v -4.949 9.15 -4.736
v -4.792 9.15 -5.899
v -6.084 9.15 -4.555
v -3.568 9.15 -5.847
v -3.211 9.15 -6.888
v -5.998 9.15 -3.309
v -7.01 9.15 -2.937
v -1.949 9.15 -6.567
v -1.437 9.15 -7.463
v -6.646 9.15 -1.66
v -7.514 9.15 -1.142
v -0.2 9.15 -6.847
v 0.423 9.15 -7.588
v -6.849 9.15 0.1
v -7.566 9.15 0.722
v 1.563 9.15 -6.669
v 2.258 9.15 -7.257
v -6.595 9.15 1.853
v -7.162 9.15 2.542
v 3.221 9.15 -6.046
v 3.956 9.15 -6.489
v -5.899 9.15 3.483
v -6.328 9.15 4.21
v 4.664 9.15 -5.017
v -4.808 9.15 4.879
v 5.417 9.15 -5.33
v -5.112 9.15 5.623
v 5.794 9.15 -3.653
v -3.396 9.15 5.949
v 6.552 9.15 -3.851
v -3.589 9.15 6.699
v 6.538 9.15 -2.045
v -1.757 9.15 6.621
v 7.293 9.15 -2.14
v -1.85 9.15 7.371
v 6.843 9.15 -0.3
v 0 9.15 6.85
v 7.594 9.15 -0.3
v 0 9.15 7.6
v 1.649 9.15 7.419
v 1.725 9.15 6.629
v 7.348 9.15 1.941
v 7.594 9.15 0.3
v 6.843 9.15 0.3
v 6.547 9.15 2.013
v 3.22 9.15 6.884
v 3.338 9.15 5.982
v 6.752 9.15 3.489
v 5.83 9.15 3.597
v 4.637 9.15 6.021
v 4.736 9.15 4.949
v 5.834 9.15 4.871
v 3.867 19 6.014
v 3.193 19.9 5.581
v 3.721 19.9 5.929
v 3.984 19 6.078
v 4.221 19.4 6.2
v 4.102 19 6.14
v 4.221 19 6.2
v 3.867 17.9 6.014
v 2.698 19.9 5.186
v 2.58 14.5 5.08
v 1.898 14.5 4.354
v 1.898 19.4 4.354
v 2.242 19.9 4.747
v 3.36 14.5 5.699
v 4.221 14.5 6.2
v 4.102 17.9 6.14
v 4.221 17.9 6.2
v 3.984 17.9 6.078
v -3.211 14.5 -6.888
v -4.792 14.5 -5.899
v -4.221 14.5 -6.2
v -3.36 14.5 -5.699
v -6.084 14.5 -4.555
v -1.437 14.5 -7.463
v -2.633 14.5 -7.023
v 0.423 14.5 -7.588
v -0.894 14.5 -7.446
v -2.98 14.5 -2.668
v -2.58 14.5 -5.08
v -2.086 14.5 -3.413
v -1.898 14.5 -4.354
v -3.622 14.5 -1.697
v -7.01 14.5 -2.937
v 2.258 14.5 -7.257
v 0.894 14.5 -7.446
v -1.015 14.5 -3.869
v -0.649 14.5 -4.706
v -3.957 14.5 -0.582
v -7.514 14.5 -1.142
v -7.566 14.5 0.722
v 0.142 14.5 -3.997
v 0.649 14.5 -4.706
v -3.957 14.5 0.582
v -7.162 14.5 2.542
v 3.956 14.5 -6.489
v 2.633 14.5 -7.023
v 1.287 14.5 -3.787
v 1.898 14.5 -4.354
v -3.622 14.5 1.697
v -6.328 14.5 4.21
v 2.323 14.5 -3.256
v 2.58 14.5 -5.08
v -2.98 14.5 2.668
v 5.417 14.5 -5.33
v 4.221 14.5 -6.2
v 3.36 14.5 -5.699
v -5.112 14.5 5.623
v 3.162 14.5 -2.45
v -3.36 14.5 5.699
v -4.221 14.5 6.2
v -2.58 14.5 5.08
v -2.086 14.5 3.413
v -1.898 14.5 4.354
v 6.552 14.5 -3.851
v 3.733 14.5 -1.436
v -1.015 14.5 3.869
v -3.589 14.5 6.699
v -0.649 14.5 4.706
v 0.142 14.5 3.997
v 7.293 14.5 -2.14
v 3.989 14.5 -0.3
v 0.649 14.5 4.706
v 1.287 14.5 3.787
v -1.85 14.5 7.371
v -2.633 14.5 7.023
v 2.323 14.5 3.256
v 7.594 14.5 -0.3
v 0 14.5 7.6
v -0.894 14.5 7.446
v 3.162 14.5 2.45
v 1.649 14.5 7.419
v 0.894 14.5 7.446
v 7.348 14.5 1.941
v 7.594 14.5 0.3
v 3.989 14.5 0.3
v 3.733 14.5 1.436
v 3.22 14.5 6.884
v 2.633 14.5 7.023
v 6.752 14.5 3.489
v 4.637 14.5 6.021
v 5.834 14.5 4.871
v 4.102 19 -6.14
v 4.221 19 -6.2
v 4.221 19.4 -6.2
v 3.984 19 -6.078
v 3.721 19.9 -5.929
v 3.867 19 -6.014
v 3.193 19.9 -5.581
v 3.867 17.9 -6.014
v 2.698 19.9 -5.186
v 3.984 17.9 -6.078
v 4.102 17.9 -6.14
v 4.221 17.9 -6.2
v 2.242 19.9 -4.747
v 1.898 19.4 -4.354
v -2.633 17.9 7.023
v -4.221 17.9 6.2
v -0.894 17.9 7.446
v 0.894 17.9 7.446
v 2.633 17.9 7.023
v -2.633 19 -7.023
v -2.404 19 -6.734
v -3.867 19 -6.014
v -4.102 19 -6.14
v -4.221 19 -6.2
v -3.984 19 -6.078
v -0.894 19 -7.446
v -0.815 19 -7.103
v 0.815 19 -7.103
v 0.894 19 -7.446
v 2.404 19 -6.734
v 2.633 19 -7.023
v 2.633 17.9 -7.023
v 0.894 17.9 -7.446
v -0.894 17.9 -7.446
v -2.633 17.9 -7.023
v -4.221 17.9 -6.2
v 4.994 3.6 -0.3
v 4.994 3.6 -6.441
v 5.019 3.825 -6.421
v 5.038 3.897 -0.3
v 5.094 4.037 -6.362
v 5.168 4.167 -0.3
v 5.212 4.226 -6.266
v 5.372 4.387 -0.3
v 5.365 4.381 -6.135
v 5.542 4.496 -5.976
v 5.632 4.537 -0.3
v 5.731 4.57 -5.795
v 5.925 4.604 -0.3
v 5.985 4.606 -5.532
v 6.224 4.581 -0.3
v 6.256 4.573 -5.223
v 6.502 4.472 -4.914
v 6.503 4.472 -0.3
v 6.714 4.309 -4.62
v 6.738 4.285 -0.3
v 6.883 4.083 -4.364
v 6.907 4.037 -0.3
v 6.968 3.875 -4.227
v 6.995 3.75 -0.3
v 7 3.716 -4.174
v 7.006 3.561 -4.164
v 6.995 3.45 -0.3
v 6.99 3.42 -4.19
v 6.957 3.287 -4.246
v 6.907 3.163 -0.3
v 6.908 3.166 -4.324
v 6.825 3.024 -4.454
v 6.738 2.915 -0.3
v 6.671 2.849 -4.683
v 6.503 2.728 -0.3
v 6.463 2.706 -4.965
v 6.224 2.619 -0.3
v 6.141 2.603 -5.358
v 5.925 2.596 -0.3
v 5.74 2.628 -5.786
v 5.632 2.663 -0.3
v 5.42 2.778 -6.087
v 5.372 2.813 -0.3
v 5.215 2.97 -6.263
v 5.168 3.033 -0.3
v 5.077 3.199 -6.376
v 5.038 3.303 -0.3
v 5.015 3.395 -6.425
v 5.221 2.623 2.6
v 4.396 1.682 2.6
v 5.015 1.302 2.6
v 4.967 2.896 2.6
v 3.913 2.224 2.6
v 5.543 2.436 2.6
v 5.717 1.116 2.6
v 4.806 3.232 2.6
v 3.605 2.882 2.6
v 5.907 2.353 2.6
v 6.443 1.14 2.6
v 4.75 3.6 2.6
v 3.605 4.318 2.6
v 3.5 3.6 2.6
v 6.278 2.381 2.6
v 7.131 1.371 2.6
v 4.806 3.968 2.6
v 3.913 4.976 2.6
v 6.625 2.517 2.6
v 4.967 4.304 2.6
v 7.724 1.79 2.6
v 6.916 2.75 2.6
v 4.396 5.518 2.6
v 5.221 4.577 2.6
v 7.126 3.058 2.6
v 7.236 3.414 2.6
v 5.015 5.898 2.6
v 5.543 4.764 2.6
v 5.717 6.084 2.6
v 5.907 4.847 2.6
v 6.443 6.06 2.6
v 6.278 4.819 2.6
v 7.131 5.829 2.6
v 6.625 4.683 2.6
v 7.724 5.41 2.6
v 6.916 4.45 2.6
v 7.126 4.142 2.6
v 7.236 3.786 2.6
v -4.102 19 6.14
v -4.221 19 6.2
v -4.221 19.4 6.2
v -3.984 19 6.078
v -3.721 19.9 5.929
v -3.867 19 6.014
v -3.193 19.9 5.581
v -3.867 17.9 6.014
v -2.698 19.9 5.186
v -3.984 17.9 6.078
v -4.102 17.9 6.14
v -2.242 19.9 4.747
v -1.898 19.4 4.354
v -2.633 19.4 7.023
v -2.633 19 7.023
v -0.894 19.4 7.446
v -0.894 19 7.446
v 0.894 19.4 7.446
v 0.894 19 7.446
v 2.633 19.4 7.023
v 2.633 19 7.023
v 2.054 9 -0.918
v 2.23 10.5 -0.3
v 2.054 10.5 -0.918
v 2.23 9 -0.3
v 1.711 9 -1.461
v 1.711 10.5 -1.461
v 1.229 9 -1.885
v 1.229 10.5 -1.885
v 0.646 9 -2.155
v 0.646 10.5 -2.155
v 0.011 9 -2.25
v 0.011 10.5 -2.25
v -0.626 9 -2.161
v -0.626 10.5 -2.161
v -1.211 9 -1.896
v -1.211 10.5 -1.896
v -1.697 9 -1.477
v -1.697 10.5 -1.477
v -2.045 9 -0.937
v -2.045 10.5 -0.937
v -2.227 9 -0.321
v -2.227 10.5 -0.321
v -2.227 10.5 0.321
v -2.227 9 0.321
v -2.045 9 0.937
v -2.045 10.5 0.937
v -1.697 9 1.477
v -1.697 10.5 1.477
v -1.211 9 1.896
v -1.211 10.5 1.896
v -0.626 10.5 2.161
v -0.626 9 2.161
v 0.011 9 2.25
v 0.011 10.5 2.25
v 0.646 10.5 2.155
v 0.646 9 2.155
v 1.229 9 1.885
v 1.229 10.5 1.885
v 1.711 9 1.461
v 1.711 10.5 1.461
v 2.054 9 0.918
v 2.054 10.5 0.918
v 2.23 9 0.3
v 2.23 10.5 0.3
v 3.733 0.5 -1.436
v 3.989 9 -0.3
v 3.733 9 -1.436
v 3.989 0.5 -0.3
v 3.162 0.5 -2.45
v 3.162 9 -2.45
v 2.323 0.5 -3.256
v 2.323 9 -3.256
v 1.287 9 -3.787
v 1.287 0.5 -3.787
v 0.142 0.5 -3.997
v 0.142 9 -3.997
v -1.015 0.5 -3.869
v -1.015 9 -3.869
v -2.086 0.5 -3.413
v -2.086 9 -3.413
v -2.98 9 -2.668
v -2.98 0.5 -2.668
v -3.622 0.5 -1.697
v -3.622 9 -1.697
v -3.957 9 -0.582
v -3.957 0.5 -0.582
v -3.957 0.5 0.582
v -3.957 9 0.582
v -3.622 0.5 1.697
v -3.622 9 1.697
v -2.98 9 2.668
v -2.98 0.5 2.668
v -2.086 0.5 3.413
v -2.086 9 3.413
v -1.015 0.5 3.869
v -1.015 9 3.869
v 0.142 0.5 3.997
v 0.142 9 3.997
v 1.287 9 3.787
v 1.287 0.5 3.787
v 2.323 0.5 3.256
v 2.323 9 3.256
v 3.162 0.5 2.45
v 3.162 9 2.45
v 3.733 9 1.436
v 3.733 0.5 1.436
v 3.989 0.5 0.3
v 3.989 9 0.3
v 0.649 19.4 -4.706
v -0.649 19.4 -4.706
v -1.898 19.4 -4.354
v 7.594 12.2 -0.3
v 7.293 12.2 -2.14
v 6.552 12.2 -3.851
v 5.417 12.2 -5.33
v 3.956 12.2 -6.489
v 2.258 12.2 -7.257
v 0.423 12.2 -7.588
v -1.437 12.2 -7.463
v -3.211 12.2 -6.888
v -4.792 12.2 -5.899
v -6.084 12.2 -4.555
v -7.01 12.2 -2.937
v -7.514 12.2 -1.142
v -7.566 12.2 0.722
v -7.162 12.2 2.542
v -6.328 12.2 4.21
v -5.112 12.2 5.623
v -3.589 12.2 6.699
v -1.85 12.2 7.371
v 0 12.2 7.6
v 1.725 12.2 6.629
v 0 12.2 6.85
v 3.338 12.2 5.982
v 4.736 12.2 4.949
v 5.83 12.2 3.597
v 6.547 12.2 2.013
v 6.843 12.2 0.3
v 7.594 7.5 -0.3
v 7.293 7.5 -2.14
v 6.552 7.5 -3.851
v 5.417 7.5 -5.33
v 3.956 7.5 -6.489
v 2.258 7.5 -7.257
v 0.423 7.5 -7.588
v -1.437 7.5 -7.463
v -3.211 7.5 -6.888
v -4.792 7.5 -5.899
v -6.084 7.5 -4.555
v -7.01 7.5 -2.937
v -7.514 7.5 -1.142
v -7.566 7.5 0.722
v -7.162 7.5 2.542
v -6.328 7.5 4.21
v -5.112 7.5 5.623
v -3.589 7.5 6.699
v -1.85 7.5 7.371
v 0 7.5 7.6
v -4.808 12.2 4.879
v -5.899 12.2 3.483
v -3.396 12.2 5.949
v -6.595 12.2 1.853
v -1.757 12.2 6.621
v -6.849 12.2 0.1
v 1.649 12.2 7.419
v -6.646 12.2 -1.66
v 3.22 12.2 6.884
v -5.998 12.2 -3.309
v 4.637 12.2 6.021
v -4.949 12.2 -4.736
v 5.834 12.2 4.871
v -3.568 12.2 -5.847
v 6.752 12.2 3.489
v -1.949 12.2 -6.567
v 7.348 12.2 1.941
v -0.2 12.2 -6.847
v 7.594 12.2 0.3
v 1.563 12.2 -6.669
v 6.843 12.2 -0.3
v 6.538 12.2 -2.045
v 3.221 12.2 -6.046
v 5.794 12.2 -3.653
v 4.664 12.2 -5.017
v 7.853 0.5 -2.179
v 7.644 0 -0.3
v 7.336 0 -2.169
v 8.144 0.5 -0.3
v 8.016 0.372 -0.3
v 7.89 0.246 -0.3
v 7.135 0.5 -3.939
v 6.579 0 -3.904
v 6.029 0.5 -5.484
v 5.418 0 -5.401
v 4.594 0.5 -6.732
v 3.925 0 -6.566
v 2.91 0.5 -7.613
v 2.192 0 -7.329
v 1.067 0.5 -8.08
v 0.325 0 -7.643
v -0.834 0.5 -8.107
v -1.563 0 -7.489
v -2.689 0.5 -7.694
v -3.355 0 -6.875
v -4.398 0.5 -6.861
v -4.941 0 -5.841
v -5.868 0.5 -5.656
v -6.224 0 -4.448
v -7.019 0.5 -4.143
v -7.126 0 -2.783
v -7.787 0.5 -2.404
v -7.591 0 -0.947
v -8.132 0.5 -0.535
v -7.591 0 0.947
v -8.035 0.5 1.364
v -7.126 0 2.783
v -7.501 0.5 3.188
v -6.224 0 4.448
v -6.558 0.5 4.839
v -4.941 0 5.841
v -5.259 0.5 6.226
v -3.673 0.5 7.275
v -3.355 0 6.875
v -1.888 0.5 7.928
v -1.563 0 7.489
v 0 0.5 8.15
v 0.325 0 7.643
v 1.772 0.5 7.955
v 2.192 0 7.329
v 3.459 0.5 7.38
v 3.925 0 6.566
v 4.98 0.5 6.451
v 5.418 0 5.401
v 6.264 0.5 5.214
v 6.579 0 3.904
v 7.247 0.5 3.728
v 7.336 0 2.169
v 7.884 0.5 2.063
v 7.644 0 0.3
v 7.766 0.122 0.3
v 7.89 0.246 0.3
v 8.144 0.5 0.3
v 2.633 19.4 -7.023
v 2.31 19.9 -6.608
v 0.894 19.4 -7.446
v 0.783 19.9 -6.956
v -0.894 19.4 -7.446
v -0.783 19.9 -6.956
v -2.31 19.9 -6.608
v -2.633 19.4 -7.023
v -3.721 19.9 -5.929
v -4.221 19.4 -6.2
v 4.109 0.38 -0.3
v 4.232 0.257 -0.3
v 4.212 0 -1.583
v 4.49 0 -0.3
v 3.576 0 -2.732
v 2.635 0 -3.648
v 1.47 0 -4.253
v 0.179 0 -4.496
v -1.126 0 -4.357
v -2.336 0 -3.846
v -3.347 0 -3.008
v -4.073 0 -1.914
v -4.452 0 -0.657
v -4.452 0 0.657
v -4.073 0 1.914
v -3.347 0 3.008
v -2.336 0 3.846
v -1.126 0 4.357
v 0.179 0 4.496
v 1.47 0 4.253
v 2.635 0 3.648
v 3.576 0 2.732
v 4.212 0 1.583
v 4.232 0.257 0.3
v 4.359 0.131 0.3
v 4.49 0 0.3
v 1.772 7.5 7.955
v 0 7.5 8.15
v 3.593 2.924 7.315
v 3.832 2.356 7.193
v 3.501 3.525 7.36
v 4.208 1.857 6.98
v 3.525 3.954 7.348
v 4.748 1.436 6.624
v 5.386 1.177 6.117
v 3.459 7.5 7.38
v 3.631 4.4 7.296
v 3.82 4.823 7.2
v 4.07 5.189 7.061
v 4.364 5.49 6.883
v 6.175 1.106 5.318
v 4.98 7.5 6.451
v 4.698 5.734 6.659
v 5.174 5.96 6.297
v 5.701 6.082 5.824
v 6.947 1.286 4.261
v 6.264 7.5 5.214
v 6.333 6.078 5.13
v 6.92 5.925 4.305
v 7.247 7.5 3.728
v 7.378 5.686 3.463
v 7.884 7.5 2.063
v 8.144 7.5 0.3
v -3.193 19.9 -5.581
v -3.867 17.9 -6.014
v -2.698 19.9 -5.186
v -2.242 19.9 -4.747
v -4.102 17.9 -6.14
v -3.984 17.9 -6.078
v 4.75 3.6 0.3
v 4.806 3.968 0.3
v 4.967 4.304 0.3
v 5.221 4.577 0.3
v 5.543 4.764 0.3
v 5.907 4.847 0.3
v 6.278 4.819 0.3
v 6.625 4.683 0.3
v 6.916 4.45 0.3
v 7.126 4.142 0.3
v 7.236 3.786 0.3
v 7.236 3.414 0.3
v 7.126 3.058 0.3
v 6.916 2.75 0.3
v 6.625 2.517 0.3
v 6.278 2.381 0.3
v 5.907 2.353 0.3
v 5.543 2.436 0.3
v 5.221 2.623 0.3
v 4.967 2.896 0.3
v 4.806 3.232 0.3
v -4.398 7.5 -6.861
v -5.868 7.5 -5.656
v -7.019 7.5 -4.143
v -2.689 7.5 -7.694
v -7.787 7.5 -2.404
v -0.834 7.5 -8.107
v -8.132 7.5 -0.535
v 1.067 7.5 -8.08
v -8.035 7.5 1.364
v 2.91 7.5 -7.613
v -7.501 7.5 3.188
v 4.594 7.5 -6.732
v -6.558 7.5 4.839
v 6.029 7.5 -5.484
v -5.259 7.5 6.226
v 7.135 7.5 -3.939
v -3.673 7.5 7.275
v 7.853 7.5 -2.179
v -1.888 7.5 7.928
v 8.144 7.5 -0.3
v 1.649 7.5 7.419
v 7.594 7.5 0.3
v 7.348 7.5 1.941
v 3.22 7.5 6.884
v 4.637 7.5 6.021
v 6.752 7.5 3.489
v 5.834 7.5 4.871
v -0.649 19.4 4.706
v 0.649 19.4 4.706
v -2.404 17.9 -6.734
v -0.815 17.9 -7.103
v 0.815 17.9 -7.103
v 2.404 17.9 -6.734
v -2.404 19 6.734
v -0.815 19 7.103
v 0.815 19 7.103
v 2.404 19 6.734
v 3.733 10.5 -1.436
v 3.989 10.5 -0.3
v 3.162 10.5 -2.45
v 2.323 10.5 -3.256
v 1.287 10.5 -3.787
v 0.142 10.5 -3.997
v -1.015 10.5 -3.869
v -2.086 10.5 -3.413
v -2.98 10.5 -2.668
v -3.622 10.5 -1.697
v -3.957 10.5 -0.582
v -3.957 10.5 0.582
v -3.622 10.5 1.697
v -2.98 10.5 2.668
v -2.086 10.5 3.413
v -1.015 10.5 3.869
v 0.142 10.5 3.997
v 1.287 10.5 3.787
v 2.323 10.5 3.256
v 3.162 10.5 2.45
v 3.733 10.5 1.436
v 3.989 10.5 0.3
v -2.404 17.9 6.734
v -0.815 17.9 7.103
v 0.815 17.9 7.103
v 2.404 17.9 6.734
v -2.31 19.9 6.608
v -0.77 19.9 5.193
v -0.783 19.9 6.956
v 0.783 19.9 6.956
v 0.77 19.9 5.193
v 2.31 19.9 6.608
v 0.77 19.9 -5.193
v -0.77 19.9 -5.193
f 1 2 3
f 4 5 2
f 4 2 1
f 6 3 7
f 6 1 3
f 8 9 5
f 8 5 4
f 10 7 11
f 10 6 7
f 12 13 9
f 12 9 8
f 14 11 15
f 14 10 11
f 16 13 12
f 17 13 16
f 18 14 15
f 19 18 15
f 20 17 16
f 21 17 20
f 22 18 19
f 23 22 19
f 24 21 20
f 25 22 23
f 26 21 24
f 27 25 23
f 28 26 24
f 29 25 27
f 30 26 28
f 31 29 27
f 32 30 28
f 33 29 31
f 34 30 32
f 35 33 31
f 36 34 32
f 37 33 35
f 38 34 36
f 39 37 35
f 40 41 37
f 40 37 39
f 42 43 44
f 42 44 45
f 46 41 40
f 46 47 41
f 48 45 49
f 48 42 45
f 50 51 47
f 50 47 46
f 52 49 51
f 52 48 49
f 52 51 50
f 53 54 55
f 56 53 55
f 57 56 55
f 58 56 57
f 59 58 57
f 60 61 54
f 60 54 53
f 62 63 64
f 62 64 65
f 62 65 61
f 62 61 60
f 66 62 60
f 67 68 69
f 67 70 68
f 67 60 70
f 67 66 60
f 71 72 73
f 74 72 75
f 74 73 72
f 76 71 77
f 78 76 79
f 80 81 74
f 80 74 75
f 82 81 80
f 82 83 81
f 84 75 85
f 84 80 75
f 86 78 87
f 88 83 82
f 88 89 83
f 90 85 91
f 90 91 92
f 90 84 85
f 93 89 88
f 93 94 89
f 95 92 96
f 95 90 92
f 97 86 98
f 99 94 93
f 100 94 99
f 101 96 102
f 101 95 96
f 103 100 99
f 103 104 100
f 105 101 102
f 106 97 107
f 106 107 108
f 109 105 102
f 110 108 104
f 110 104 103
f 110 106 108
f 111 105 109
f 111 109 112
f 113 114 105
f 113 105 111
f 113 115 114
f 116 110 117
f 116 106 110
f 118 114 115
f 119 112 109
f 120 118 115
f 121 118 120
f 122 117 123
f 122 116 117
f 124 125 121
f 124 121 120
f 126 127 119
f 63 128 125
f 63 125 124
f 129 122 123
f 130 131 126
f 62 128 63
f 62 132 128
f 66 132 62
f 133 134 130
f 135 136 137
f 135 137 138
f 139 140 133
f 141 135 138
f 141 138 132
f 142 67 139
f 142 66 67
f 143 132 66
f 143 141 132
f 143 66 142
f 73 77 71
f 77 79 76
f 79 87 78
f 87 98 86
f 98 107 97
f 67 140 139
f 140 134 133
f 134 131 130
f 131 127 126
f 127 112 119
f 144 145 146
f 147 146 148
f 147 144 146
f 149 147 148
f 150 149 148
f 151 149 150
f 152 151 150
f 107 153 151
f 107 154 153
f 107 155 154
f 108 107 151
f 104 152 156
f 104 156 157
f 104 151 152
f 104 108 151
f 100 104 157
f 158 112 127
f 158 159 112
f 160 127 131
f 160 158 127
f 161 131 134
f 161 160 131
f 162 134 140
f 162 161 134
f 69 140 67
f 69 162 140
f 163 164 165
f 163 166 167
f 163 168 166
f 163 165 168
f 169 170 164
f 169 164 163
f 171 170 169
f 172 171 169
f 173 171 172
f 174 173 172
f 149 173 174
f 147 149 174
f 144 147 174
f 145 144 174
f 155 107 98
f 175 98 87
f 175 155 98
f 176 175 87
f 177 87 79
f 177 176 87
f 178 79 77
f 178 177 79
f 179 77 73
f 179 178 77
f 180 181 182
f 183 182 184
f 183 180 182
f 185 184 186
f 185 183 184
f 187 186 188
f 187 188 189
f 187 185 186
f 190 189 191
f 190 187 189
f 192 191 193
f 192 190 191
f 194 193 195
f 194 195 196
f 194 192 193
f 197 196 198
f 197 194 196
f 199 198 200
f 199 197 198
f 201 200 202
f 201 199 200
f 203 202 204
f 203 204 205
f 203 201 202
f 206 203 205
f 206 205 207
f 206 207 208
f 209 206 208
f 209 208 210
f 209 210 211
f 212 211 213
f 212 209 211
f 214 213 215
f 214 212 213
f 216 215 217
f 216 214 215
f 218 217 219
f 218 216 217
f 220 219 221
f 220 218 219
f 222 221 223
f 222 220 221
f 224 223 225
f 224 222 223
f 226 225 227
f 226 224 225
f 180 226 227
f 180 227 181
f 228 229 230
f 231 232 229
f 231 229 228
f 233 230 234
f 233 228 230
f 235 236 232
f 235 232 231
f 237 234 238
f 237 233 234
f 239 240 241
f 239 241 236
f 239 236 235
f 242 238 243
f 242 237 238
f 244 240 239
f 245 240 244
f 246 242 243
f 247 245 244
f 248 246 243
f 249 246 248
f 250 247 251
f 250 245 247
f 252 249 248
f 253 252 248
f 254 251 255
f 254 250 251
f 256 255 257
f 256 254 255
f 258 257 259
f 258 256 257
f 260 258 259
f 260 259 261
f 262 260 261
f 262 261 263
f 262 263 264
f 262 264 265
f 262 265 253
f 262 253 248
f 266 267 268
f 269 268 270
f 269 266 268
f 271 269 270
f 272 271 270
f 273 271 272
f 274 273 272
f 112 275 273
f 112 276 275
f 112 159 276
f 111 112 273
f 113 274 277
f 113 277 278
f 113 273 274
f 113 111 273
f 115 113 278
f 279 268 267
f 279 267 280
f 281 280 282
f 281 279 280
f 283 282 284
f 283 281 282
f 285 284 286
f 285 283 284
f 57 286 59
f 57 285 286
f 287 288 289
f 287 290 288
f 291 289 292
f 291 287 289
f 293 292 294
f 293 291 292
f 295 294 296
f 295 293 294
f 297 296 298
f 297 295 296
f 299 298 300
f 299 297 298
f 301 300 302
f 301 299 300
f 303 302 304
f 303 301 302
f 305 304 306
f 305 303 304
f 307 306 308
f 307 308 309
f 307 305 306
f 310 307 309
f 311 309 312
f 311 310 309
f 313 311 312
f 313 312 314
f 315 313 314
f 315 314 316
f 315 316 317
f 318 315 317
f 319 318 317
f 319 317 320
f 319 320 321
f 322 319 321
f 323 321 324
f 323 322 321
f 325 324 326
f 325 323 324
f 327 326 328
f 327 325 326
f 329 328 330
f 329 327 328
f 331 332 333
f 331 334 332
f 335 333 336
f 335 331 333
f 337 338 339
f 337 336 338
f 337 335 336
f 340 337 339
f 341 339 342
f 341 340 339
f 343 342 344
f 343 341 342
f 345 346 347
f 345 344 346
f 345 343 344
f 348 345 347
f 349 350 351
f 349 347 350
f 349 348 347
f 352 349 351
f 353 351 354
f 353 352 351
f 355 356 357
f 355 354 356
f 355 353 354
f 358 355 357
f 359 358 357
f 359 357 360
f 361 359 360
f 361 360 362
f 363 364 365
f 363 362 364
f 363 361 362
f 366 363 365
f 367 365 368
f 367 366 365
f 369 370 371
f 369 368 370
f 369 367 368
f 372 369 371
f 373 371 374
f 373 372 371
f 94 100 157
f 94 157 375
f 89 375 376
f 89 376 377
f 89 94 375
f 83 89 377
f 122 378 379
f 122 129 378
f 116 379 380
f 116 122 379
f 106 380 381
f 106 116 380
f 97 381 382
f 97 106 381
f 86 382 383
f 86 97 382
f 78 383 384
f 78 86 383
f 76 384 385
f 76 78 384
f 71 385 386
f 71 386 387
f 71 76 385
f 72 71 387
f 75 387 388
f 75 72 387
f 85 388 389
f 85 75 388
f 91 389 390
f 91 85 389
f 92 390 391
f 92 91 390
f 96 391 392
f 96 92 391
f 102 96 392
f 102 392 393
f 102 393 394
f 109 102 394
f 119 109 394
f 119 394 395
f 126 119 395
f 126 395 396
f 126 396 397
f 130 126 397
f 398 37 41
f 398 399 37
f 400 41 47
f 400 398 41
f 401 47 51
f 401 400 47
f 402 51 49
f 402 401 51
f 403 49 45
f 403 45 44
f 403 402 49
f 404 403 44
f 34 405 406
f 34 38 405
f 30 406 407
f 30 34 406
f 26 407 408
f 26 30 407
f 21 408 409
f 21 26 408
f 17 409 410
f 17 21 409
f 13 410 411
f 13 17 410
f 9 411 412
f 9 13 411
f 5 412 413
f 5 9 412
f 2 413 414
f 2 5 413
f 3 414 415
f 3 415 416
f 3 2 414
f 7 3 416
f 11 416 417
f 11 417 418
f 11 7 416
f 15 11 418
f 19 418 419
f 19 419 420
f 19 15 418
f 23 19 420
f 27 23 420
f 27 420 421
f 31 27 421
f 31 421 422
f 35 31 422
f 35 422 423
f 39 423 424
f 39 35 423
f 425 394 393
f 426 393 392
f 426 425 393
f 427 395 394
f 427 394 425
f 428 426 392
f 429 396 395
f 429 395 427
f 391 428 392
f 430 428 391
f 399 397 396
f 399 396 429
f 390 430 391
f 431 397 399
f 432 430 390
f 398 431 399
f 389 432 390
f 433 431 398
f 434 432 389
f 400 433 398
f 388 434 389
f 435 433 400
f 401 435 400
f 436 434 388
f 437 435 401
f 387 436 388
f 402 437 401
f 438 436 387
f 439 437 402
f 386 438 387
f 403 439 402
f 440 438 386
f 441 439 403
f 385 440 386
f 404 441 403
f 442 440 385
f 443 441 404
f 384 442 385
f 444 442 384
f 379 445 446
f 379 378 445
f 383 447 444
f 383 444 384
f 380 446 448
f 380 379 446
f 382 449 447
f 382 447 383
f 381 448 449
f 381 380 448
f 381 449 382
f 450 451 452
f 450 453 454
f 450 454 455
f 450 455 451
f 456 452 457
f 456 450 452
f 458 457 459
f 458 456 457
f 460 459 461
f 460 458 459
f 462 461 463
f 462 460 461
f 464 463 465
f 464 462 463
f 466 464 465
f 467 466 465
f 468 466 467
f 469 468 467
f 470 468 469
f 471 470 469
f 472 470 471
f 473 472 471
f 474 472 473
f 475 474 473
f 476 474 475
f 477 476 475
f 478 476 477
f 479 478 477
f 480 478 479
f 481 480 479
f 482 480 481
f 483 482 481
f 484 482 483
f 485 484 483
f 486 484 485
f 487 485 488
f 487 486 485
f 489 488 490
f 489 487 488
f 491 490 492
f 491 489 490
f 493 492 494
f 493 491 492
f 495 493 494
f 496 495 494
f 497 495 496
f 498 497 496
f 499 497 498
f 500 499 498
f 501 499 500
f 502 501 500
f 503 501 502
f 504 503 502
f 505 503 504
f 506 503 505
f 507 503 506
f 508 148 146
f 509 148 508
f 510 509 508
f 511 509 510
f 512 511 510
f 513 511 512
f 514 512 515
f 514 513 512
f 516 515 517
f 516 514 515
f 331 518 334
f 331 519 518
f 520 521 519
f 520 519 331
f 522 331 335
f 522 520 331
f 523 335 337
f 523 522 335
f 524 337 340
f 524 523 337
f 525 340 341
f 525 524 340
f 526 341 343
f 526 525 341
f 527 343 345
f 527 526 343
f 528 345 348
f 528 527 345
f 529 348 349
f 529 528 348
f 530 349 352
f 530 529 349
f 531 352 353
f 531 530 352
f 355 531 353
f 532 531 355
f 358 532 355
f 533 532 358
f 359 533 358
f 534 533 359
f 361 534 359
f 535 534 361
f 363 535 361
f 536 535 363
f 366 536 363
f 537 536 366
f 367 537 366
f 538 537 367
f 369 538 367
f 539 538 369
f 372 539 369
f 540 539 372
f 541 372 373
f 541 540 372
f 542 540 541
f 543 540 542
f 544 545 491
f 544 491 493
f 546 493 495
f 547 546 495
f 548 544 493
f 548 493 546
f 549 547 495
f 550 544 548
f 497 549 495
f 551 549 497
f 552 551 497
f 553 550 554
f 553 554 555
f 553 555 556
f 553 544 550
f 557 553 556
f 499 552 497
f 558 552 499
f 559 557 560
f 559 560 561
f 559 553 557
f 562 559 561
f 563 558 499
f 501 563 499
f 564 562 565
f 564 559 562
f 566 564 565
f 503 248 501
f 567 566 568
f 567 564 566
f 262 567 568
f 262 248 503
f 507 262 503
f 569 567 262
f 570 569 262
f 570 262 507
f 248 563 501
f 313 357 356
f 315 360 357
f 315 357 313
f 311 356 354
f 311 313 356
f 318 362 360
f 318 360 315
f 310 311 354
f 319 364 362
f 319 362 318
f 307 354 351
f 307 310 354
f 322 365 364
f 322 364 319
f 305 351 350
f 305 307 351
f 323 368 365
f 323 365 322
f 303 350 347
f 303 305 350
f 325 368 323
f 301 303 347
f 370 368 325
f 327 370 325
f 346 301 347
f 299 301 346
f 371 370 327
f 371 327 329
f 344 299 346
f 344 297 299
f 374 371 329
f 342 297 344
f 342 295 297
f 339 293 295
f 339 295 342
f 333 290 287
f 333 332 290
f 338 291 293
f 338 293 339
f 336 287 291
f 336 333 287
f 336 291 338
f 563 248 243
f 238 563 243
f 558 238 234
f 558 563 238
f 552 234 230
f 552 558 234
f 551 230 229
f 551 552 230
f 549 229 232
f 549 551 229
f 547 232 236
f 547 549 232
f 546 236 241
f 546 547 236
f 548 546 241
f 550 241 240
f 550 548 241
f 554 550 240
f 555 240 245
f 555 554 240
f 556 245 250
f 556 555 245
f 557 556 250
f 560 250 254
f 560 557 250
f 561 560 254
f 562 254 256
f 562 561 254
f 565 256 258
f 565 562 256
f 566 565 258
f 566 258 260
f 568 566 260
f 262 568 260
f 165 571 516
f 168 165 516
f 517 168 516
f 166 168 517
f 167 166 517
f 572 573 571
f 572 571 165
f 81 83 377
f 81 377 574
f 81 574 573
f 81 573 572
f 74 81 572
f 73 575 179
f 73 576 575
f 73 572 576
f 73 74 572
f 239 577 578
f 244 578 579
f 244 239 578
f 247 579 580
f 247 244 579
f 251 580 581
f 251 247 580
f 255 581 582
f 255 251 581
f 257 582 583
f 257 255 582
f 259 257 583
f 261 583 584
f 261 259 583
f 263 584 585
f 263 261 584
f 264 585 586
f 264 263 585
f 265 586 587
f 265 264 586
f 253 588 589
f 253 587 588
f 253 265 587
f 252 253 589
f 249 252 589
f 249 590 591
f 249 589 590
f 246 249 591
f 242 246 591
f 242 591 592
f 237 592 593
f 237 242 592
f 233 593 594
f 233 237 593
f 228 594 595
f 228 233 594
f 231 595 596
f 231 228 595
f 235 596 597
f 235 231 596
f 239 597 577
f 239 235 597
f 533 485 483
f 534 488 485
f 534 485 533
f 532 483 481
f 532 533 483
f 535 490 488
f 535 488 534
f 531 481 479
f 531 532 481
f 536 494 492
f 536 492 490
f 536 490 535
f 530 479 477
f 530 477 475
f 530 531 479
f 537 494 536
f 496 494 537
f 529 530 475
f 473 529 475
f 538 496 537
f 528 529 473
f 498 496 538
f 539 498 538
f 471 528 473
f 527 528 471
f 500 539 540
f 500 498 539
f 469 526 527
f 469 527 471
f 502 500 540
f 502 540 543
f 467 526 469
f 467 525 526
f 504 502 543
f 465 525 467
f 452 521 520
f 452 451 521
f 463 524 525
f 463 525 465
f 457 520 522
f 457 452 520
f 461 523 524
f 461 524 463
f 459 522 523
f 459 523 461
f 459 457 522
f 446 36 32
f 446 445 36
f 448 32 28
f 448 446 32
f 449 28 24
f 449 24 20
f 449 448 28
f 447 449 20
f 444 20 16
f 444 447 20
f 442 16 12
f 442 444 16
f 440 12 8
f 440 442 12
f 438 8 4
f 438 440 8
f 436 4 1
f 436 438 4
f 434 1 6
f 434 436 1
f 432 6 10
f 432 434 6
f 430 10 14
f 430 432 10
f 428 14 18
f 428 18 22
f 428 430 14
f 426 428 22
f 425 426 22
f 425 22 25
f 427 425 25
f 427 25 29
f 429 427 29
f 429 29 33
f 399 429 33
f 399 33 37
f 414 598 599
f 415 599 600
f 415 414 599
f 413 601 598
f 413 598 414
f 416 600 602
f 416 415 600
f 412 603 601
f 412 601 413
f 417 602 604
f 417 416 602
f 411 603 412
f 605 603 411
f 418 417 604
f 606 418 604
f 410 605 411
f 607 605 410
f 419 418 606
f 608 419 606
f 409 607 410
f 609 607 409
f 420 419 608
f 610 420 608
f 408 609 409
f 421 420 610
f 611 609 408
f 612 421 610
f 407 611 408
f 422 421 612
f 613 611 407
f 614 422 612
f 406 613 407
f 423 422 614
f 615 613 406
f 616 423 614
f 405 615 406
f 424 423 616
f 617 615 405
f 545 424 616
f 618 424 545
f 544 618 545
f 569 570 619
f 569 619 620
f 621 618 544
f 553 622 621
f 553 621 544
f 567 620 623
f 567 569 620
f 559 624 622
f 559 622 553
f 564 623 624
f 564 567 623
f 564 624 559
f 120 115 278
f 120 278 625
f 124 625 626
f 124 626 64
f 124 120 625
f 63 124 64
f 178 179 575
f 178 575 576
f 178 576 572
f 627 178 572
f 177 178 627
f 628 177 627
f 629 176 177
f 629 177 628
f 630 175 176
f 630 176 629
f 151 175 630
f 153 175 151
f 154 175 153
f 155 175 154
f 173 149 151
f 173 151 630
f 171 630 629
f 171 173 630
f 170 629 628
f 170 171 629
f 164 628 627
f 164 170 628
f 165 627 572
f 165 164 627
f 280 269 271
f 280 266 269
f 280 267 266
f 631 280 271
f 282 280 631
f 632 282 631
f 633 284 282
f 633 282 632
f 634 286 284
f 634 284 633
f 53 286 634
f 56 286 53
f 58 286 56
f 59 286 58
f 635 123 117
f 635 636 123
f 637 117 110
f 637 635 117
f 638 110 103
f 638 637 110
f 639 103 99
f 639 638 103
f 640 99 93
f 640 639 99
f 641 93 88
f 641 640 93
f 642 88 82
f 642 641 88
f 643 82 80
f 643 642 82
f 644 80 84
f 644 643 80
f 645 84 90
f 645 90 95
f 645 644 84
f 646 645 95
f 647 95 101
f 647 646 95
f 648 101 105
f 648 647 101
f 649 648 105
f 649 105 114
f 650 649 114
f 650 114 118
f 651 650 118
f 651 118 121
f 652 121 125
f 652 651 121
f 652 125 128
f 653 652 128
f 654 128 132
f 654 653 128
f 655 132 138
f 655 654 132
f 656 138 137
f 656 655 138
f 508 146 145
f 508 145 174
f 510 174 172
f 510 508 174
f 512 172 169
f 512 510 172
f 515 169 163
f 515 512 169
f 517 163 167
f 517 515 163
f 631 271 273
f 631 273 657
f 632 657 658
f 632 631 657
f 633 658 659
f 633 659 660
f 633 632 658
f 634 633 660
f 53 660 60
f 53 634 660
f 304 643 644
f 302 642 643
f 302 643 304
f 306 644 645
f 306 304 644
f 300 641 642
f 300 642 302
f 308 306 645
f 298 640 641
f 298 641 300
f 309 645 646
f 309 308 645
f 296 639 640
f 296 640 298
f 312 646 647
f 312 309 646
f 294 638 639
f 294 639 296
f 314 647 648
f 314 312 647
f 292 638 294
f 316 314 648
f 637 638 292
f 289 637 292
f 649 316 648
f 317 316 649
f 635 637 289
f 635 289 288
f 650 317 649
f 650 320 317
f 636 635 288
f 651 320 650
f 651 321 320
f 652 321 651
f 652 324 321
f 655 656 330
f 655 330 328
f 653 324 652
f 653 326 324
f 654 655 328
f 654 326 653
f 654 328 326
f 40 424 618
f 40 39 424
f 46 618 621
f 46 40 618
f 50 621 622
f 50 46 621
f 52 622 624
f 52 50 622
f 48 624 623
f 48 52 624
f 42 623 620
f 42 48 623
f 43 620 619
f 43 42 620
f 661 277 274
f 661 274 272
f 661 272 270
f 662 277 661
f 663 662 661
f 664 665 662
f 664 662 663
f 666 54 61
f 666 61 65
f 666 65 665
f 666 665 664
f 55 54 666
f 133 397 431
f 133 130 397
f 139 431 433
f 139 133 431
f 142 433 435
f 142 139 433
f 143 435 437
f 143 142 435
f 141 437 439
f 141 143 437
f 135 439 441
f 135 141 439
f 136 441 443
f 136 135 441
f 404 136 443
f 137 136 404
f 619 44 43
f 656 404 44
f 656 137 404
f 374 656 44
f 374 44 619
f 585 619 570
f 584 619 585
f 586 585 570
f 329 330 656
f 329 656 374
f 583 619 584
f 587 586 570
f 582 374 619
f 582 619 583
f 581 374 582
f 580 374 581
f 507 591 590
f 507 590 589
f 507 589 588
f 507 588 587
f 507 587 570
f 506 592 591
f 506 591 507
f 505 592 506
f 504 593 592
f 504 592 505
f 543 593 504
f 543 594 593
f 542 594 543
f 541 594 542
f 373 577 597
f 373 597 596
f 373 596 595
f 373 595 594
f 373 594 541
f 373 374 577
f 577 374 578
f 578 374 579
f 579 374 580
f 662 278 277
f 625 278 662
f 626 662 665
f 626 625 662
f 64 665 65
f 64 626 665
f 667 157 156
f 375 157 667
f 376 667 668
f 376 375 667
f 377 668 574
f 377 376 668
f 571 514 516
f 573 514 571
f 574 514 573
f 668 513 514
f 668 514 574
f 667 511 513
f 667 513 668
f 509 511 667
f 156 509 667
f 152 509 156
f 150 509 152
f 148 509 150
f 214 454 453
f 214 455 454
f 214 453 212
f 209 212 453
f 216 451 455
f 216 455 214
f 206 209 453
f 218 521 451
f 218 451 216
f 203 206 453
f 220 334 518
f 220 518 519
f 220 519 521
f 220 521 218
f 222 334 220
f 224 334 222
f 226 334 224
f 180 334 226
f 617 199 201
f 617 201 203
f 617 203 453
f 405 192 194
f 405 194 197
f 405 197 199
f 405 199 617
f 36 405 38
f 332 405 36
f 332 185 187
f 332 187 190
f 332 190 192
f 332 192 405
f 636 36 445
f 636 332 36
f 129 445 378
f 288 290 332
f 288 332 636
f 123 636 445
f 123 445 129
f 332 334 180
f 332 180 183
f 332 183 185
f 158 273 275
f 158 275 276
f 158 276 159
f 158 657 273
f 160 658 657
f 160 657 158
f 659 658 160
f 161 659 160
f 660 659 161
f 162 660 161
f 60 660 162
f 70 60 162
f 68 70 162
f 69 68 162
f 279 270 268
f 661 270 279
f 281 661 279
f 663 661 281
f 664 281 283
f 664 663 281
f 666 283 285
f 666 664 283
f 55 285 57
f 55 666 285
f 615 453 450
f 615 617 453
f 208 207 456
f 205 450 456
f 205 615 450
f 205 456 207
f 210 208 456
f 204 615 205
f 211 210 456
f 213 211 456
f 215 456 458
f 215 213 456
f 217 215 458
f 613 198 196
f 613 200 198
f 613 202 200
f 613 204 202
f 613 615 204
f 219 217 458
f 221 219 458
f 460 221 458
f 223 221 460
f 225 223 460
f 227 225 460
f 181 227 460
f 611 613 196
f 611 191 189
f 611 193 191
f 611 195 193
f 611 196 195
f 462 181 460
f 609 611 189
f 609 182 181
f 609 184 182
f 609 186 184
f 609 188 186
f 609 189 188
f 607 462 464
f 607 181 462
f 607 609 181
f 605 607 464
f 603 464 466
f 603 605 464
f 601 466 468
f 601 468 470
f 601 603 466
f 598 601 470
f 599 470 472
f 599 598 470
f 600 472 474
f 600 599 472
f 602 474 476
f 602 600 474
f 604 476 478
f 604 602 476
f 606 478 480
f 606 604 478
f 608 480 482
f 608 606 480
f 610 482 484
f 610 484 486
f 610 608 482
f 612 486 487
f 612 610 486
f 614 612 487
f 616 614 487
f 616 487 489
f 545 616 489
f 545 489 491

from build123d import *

# Parameters (mm, degrees)
SKETCH3_R          = 6.9
CUT_EXTRUDE1_DEPTH = 6
SKETCH4_R          = 6.9
CUT_EXTRUDE2_DEPTH = 6
CUT_EXTRUDE3_DEPTH = 8.15


with BuildPart() as part:
    # Sketch1 → Revolve1 (revolve)
    with BuildSketch(Plane.XY):
        Polygon((2.25, 9), (4, 9), (4, 0.5), (4.5, 0), (7.65, 0), (8.15, 0.5), (8.15, 7.5), (7.6, 7.5), (7.6, 9.15), (6.85, 9.15), (6.85, 12.2), (7.6, 12.2), (7.6, 14.5), (4, 14.5), (4, 10.5), (2.25, 10.5), align=None)
    revolve(axis=Axis((0, 0, 0), (0, 1, 0)))

    # Sketch2 → Revolve2 (revolve)
    with BuildSketch(Plane(origin=(0, 0, 0), x_dir=(0, 0, -1), z_dir=(1, 0, 0))):
        Polygon((4.75, 14.5), (7.5, 14.5), (7.5, 17.9), (7.15, 17.9), (7.15, 19), (7.5, 19), (7.5, 19.4), (7, 19.9), (5.25, 19.9), (4.75, 19.4), align=None)
    revolve(axis=Axis((0, 14.5, 0), (0, 1, 0)))

    # Sketch3 → Cut-Extrude1 (cut)
    with BuildSketch(Plane(origin=(0, 14.5, 0), x_dir=(1, 0, 0), z_dir=(0, 1, 0))):
        with Locations((7.25, 0)):
            Circle(SKETCH3_R)
    extrude(amount=CUT_EXTRUDE1_DEPTH, mode=Mode.SUBTRACT)

    # Sketch4 → Cut-Extrude2 (cut)
    with BuildSketch(Plane(origin=(0, 14.5, 0), x_dir=(1, 0, 0), z_dir=(0, 1, 0))):
        with Locations((-7.25, 0)):
            Circle(SKETCH4_R)
    extrude(amount=CUT_EXTRUDE2_DEPTH, mode=Mode.SUBTRACT)

    # Sketch5 → Cut-Revolve1 (revolve, cut)
    with BuildSketch(Plane(origin=(0, 3.6, 0), x_dir=(1, 0, 0), z_dir=(0, 1, 0))):
        Polygon((6, 6.55), (7.0065, 6.55), (7.0065, 0.3), (7.25, 0.3), (7.25, -2.6), (8.5, -2.6), (8.5, -8.15), (6, -8.15), align=None)
    revolve(axis=Axis((6, 3.6, 8.15), (0, 0, -1)), mode=Mode.SUBTRACT)

    # Sketch6 → Cut-Extrude3 (cut)
    with BuildSketch(Plane(origin=(0, 0, 0), x_dir=(0, 0, -1), z_dir=(1, 0, 0))):
        with BuildLine():
            Line((-0.3, 19.9), (-0.3, 0))
            Line((-0.3, 0), (0.3, 0))
            Line((0.3, 0), (0.3, 19.9))
            ThreePointArc((0.3, 19.9), (0, 20.2), (-0.3, 19.9))
        make_face()
    extrude(amount=CUT_EXTRUDE3_DEPTH, mode=Mode.SUBTRACT)


solid = part.part
